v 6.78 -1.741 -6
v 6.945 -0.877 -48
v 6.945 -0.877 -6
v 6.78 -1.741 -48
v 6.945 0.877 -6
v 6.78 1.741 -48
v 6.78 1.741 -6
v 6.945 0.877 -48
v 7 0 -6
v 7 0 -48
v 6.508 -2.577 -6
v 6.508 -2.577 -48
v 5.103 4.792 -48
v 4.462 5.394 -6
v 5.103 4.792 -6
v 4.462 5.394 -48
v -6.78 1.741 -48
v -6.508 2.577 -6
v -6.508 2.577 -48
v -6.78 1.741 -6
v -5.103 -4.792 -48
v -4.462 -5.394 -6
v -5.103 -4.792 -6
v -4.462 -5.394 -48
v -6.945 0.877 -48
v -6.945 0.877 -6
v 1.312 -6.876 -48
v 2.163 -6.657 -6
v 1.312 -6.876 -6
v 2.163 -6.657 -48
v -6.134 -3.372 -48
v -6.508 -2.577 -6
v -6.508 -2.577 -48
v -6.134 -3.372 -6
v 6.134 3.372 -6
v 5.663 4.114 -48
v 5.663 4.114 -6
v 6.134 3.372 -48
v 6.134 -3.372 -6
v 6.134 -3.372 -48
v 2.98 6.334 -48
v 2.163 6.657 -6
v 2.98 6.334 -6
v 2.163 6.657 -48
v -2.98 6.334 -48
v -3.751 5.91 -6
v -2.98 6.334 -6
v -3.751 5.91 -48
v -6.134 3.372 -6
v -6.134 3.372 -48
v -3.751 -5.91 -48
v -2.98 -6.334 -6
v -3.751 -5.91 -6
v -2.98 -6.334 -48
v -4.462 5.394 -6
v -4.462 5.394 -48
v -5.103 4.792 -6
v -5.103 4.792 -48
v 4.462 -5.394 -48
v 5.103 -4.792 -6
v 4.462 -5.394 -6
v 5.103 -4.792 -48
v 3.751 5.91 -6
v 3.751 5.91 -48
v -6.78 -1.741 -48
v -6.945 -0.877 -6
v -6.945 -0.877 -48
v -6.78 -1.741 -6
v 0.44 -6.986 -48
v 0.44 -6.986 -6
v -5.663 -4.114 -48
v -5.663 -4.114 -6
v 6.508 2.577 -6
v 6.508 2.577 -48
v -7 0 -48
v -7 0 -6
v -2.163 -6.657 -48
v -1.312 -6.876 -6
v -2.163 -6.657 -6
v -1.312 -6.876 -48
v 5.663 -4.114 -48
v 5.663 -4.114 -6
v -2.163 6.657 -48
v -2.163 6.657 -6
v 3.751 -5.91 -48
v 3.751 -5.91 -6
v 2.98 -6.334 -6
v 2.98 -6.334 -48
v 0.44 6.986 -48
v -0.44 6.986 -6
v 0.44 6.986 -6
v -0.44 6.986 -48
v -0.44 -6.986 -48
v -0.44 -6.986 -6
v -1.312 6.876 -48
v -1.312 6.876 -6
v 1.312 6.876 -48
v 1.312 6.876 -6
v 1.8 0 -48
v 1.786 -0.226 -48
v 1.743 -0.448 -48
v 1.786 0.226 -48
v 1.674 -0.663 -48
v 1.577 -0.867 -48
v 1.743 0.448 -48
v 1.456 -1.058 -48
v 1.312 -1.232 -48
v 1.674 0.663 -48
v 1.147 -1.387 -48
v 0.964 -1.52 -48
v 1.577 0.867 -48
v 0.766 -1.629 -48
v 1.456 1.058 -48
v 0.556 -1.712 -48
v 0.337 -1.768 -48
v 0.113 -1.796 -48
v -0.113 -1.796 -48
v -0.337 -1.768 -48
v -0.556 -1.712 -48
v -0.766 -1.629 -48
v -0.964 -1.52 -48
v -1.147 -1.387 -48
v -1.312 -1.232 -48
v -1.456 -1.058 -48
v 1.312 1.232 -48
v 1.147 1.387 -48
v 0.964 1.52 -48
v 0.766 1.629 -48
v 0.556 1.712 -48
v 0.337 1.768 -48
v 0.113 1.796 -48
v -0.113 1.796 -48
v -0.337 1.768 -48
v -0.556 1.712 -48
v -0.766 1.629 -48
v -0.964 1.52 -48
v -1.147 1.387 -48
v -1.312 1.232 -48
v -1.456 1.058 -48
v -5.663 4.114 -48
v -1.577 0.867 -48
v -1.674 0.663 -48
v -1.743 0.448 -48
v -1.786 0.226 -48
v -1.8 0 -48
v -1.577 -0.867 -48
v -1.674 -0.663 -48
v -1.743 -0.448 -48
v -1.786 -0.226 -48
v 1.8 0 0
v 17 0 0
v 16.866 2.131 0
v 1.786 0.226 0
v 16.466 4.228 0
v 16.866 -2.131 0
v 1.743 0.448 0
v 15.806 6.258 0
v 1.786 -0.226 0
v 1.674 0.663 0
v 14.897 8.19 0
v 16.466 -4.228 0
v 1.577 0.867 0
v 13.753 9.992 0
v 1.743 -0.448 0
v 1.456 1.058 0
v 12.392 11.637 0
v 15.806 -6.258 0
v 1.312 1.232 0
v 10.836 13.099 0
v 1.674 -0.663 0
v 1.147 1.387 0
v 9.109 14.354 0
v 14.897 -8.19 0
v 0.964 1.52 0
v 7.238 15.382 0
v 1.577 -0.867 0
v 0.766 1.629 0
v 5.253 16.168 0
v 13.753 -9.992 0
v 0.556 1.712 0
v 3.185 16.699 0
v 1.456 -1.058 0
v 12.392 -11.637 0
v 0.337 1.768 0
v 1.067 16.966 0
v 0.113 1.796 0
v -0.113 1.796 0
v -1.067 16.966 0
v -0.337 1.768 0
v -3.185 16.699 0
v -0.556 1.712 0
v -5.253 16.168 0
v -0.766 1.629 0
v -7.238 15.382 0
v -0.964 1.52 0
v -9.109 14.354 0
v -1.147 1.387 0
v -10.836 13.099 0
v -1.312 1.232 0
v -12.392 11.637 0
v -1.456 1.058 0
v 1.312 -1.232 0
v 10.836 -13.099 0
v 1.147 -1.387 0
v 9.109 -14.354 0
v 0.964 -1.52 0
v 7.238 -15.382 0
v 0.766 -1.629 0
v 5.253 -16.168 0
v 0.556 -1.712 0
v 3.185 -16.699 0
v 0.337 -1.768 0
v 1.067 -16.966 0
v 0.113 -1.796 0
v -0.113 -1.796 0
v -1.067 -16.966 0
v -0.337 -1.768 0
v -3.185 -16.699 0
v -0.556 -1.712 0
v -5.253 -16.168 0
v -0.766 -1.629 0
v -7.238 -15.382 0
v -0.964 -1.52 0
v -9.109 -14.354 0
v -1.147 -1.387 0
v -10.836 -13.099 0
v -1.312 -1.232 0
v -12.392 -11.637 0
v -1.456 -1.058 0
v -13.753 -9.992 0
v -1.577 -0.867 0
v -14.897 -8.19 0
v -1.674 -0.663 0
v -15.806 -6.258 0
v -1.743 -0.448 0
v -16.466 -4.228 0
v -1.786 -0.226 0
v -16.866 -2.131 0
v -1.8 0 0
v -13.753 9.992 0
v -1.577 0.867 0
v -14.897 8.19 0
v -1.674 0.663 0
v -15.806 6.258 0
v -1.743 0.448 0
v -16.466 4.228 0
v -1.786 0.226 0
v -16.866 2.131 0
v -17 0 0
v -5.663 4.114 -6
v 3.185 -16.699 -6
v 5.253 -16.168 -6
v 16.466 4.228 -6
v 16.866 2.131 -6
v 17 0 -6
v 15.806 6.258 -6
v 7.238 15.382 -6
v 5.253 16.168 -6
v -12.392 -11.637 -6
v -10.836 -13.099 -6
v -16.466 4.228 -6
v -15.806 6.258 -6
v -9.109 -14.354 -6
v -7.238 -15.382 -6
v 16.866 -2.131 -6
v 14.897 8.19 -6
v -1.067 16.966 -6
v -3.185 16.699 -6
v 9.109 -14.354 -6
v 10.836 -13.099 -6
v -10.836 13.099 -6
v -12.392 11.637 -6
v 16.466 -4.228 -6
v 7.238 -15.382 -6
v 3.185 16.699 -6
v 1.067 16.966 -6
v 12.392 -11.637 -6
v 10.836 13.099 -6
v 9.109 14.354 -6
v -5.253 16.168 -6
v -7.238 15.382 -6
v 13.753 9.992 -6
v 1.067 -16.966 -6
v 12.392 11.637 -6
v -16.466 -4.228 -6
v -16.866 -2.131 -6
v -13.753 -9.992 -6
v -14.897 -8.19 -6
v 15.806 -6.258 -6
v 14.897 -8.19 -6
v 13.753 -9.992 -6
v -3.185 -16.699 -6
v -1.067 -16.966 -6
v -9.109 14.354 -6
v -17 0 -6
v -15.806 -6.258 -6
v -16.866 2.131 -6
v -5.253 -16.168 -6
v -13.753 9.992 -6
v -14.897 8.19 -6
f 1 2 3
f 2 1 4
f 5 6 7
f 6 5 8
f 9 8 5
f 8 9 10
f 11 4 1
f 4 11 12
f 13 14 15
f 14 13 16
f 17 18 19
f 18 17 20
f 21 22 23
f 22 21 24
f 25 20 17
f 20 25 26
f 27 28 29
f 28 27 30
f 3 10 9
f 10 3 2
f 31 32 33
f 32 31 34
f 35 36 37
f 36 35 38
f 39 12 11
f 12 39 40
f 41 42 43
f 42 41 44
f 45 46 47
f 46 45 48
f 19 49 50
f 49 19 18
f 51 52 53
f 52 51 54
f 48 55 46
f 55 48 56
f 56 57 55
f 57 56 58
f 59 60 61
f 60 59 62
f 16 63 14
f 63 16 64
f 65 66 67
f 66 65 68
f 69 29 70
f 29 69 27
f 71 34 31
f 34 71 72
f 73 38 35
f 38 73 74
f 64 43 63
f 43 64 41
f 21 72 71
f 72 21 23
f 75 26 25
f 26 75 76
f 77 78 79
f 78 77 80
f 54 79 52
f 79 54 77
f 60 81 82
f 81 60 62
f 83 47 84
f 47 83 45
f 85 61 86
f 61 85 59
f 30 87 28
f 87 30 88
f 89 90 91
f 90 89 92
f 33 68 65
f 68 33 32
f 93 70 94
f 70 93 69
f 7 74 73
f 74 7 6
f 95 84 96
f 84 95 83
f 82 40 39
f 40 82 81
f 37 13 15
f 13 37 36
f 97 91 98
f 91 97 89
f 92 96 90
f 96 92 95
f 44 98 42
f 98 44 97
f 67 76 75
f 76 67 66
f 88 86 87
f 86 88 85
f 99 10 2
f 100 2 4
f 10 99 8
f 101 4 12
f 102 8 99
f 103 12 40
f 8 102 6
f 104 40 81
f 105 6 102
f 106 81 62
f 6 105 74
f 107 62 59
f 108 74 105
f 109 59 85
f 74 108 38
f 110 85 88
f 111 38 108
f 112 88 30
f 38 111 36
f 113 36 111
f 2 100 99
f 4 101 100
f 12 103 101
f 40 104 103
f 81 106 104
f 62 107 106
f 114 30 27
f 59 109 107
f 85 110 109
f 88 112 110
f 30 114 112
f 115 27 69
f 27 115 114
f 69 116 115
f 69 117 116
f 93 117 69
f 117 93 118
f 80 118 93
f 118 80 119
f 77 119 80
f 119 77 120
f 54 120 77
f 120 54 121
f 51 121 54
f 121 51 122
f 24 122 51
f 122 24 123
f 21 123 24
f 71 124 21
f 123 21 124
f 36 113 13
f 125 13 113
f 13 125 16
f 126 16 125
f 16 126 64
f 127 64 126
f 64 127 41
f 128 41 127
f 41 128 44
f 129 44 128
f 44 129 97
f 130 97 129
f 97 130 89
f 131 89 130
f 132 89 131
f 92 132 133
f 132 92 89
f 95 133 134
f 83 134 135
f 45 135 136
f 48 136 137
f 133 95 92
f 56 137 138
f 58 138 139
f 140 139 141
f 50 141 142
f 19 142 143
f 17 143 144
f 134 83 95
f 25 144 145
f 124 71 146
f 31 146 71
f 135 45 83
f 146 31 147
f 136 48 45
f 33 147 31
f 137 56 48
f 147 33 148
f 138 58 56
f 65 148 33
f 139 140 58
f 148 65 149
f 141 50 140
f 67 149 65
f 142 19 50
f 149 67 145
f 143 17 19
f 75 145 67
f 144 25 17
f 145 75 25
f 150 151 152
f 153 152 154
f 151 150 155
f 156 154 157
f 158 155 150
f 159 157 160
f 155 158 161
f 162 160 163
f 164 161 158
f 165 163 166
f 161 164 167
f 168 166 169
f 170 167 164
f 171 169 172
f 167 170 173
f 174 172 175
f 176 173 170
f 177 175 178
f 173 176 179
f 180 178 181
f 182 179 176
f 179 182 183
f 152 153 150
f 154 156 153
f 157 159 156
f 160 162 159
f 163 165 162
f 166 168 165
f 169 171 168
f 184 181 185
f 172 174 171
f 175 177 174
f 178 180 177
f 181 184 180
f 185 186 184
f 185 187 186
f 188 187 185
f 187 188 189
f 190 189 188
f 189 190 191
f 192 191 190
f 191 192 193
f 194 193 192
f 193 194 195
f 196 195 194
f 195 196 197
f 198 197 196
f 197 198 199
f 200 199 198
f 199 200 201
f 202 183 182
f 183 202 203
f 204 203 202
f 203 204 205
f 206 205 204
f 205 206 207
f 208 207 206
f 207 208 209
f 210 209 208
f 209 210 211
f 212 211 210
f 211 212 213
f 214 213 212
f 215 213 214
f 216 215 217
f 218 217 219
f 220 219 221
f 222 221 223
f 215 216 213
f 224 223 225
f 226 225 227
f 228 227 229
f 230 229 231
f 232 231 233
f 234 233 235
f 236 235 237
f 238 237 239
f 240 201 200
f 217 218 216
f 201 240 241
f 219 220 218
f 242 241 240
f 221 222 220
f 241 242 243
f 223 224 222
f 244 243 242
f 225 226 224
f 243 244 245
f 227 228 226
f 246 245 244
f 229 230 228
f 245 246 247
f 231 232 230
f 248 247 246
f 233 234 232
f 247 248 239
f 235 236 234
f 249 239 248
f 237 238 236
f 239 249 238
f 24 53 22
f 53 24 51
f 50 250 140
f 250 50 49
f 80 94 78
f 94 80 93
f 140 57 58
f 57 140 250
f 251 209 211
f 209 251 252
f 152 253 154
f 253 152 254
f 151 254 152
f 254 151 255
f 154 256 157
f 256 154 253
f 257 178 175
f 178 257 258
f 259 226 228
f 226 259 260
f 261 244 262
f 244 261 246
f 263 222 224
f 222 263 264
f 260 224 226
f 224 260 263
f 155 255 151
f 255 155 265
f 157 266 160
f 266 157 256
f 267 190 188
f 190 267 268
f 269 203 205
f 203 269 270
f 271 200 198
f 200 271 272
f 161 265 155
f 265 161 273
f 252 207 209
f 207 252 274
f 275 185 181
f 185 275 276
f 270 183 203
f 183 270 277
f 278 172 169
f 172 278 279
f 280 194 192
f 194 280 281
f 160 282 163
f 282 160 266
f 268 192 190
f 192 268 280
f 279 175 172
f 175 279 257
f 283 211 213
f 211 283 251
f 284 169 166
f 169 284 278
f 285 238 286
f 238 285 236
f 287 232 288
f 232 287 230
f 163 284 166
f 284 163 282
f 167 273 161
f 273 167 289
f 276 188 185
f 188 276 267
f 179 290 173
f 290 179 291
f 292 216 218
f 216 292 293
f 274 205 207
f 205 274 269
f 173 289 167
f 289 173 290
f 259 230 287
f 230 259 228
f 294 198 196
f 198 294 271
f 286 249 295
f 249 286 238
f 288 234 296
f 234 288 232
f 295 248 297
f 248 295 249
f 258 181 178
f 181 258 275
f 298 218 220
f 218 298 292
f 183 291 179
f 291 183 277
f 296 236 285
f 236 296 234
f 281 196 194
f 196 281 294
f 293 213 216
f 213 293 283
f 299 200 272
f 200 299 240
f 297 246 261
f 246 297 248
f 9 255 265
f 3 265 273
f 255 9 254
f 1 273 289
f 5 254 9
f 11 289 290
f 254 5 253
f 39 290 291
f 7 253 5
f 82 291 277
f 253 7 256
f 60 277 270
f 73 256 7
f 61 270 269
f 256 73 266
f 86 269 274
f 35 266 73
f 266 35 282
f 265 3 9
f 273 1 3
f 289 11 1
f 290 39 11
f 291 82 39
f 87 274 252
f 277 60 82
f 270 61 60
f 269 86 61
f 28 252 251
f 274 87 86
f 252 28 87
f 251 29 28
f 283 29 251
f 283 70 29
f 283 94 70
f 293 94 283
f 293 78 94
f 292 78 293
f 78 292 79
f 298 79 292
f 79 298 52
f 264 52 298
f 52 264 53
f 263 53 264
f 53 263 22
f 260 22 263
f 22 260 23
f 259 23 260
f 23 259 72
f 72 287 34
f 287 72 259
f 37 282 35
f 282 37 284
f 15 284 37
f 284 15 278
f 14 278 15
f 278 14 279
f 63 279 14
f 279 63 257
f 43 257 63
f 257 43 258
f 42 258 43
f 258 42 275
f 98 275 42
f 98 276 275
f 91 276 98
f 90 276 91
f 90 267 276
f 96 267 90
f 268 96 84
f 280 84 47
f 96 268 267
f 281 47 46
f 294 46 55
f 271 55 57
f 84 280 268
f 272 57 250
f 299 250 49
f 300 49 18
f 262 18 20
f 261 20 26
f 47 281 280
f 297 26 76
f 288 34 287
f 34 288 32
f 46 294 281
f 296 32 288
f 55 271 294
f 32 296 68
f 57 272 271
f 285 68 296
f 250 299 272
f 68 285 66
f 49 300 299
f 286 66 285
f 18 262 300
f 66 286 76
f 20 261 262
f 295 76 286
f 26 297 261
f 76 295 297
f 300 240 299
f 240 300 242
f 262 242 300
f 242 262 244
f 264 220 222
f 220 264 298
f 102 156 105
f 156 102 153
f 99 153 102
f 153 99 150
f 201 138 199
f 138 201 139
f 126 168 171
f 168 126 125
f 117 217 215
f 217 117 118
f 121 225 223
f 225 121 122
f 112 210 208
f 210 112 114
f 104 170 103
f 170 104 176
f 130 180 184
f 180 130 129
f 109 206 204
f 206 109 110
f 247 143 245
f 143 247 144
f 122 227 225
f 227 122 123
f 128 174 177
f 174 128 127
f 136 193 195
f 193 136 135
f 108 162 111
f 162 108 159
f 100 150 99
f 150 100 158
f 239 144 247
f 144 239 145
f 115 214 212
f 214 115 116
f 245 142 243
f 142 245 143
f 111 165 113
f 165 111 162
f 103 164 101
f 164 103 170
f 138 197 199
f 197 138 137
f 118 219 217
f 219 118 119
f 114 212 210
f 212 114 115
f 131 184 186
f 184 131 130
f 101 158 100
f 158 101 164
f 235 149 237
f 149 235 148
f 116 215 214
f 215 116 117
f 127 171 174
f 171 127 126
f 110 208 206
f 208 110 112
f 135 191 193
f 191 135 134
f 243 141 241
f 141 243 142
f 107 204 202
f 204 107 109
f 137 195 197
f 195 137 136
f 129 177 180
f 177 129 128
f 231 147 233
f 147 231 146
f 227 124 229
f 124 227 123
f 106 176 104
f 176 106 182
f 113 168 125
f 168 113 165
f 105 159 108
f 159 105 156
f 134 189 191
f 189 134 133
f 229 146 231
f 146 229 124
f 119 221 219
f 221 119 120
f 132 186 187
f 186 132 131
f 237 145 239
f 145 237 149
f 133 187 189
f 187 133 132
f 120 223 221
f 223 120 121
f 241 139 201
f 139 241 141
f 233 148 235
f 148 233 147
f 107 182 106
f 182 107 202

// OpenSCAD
$fn = 50;


difference() {
	union() {
		translate(v = [0, 0, -48.0000000000]) {
			cylinder(h = 48, r = 7.0000000000);
		}
		translate(v = [0, 0, -6.0000000000]) {
			cylinder(h = 6, r = 17.0000000000);
		}
	}
	union() {
		#translate(v = [0, 0, -48]) {
			cylinder(h = 48, r = 1.8000000000);
		}
	}
}
